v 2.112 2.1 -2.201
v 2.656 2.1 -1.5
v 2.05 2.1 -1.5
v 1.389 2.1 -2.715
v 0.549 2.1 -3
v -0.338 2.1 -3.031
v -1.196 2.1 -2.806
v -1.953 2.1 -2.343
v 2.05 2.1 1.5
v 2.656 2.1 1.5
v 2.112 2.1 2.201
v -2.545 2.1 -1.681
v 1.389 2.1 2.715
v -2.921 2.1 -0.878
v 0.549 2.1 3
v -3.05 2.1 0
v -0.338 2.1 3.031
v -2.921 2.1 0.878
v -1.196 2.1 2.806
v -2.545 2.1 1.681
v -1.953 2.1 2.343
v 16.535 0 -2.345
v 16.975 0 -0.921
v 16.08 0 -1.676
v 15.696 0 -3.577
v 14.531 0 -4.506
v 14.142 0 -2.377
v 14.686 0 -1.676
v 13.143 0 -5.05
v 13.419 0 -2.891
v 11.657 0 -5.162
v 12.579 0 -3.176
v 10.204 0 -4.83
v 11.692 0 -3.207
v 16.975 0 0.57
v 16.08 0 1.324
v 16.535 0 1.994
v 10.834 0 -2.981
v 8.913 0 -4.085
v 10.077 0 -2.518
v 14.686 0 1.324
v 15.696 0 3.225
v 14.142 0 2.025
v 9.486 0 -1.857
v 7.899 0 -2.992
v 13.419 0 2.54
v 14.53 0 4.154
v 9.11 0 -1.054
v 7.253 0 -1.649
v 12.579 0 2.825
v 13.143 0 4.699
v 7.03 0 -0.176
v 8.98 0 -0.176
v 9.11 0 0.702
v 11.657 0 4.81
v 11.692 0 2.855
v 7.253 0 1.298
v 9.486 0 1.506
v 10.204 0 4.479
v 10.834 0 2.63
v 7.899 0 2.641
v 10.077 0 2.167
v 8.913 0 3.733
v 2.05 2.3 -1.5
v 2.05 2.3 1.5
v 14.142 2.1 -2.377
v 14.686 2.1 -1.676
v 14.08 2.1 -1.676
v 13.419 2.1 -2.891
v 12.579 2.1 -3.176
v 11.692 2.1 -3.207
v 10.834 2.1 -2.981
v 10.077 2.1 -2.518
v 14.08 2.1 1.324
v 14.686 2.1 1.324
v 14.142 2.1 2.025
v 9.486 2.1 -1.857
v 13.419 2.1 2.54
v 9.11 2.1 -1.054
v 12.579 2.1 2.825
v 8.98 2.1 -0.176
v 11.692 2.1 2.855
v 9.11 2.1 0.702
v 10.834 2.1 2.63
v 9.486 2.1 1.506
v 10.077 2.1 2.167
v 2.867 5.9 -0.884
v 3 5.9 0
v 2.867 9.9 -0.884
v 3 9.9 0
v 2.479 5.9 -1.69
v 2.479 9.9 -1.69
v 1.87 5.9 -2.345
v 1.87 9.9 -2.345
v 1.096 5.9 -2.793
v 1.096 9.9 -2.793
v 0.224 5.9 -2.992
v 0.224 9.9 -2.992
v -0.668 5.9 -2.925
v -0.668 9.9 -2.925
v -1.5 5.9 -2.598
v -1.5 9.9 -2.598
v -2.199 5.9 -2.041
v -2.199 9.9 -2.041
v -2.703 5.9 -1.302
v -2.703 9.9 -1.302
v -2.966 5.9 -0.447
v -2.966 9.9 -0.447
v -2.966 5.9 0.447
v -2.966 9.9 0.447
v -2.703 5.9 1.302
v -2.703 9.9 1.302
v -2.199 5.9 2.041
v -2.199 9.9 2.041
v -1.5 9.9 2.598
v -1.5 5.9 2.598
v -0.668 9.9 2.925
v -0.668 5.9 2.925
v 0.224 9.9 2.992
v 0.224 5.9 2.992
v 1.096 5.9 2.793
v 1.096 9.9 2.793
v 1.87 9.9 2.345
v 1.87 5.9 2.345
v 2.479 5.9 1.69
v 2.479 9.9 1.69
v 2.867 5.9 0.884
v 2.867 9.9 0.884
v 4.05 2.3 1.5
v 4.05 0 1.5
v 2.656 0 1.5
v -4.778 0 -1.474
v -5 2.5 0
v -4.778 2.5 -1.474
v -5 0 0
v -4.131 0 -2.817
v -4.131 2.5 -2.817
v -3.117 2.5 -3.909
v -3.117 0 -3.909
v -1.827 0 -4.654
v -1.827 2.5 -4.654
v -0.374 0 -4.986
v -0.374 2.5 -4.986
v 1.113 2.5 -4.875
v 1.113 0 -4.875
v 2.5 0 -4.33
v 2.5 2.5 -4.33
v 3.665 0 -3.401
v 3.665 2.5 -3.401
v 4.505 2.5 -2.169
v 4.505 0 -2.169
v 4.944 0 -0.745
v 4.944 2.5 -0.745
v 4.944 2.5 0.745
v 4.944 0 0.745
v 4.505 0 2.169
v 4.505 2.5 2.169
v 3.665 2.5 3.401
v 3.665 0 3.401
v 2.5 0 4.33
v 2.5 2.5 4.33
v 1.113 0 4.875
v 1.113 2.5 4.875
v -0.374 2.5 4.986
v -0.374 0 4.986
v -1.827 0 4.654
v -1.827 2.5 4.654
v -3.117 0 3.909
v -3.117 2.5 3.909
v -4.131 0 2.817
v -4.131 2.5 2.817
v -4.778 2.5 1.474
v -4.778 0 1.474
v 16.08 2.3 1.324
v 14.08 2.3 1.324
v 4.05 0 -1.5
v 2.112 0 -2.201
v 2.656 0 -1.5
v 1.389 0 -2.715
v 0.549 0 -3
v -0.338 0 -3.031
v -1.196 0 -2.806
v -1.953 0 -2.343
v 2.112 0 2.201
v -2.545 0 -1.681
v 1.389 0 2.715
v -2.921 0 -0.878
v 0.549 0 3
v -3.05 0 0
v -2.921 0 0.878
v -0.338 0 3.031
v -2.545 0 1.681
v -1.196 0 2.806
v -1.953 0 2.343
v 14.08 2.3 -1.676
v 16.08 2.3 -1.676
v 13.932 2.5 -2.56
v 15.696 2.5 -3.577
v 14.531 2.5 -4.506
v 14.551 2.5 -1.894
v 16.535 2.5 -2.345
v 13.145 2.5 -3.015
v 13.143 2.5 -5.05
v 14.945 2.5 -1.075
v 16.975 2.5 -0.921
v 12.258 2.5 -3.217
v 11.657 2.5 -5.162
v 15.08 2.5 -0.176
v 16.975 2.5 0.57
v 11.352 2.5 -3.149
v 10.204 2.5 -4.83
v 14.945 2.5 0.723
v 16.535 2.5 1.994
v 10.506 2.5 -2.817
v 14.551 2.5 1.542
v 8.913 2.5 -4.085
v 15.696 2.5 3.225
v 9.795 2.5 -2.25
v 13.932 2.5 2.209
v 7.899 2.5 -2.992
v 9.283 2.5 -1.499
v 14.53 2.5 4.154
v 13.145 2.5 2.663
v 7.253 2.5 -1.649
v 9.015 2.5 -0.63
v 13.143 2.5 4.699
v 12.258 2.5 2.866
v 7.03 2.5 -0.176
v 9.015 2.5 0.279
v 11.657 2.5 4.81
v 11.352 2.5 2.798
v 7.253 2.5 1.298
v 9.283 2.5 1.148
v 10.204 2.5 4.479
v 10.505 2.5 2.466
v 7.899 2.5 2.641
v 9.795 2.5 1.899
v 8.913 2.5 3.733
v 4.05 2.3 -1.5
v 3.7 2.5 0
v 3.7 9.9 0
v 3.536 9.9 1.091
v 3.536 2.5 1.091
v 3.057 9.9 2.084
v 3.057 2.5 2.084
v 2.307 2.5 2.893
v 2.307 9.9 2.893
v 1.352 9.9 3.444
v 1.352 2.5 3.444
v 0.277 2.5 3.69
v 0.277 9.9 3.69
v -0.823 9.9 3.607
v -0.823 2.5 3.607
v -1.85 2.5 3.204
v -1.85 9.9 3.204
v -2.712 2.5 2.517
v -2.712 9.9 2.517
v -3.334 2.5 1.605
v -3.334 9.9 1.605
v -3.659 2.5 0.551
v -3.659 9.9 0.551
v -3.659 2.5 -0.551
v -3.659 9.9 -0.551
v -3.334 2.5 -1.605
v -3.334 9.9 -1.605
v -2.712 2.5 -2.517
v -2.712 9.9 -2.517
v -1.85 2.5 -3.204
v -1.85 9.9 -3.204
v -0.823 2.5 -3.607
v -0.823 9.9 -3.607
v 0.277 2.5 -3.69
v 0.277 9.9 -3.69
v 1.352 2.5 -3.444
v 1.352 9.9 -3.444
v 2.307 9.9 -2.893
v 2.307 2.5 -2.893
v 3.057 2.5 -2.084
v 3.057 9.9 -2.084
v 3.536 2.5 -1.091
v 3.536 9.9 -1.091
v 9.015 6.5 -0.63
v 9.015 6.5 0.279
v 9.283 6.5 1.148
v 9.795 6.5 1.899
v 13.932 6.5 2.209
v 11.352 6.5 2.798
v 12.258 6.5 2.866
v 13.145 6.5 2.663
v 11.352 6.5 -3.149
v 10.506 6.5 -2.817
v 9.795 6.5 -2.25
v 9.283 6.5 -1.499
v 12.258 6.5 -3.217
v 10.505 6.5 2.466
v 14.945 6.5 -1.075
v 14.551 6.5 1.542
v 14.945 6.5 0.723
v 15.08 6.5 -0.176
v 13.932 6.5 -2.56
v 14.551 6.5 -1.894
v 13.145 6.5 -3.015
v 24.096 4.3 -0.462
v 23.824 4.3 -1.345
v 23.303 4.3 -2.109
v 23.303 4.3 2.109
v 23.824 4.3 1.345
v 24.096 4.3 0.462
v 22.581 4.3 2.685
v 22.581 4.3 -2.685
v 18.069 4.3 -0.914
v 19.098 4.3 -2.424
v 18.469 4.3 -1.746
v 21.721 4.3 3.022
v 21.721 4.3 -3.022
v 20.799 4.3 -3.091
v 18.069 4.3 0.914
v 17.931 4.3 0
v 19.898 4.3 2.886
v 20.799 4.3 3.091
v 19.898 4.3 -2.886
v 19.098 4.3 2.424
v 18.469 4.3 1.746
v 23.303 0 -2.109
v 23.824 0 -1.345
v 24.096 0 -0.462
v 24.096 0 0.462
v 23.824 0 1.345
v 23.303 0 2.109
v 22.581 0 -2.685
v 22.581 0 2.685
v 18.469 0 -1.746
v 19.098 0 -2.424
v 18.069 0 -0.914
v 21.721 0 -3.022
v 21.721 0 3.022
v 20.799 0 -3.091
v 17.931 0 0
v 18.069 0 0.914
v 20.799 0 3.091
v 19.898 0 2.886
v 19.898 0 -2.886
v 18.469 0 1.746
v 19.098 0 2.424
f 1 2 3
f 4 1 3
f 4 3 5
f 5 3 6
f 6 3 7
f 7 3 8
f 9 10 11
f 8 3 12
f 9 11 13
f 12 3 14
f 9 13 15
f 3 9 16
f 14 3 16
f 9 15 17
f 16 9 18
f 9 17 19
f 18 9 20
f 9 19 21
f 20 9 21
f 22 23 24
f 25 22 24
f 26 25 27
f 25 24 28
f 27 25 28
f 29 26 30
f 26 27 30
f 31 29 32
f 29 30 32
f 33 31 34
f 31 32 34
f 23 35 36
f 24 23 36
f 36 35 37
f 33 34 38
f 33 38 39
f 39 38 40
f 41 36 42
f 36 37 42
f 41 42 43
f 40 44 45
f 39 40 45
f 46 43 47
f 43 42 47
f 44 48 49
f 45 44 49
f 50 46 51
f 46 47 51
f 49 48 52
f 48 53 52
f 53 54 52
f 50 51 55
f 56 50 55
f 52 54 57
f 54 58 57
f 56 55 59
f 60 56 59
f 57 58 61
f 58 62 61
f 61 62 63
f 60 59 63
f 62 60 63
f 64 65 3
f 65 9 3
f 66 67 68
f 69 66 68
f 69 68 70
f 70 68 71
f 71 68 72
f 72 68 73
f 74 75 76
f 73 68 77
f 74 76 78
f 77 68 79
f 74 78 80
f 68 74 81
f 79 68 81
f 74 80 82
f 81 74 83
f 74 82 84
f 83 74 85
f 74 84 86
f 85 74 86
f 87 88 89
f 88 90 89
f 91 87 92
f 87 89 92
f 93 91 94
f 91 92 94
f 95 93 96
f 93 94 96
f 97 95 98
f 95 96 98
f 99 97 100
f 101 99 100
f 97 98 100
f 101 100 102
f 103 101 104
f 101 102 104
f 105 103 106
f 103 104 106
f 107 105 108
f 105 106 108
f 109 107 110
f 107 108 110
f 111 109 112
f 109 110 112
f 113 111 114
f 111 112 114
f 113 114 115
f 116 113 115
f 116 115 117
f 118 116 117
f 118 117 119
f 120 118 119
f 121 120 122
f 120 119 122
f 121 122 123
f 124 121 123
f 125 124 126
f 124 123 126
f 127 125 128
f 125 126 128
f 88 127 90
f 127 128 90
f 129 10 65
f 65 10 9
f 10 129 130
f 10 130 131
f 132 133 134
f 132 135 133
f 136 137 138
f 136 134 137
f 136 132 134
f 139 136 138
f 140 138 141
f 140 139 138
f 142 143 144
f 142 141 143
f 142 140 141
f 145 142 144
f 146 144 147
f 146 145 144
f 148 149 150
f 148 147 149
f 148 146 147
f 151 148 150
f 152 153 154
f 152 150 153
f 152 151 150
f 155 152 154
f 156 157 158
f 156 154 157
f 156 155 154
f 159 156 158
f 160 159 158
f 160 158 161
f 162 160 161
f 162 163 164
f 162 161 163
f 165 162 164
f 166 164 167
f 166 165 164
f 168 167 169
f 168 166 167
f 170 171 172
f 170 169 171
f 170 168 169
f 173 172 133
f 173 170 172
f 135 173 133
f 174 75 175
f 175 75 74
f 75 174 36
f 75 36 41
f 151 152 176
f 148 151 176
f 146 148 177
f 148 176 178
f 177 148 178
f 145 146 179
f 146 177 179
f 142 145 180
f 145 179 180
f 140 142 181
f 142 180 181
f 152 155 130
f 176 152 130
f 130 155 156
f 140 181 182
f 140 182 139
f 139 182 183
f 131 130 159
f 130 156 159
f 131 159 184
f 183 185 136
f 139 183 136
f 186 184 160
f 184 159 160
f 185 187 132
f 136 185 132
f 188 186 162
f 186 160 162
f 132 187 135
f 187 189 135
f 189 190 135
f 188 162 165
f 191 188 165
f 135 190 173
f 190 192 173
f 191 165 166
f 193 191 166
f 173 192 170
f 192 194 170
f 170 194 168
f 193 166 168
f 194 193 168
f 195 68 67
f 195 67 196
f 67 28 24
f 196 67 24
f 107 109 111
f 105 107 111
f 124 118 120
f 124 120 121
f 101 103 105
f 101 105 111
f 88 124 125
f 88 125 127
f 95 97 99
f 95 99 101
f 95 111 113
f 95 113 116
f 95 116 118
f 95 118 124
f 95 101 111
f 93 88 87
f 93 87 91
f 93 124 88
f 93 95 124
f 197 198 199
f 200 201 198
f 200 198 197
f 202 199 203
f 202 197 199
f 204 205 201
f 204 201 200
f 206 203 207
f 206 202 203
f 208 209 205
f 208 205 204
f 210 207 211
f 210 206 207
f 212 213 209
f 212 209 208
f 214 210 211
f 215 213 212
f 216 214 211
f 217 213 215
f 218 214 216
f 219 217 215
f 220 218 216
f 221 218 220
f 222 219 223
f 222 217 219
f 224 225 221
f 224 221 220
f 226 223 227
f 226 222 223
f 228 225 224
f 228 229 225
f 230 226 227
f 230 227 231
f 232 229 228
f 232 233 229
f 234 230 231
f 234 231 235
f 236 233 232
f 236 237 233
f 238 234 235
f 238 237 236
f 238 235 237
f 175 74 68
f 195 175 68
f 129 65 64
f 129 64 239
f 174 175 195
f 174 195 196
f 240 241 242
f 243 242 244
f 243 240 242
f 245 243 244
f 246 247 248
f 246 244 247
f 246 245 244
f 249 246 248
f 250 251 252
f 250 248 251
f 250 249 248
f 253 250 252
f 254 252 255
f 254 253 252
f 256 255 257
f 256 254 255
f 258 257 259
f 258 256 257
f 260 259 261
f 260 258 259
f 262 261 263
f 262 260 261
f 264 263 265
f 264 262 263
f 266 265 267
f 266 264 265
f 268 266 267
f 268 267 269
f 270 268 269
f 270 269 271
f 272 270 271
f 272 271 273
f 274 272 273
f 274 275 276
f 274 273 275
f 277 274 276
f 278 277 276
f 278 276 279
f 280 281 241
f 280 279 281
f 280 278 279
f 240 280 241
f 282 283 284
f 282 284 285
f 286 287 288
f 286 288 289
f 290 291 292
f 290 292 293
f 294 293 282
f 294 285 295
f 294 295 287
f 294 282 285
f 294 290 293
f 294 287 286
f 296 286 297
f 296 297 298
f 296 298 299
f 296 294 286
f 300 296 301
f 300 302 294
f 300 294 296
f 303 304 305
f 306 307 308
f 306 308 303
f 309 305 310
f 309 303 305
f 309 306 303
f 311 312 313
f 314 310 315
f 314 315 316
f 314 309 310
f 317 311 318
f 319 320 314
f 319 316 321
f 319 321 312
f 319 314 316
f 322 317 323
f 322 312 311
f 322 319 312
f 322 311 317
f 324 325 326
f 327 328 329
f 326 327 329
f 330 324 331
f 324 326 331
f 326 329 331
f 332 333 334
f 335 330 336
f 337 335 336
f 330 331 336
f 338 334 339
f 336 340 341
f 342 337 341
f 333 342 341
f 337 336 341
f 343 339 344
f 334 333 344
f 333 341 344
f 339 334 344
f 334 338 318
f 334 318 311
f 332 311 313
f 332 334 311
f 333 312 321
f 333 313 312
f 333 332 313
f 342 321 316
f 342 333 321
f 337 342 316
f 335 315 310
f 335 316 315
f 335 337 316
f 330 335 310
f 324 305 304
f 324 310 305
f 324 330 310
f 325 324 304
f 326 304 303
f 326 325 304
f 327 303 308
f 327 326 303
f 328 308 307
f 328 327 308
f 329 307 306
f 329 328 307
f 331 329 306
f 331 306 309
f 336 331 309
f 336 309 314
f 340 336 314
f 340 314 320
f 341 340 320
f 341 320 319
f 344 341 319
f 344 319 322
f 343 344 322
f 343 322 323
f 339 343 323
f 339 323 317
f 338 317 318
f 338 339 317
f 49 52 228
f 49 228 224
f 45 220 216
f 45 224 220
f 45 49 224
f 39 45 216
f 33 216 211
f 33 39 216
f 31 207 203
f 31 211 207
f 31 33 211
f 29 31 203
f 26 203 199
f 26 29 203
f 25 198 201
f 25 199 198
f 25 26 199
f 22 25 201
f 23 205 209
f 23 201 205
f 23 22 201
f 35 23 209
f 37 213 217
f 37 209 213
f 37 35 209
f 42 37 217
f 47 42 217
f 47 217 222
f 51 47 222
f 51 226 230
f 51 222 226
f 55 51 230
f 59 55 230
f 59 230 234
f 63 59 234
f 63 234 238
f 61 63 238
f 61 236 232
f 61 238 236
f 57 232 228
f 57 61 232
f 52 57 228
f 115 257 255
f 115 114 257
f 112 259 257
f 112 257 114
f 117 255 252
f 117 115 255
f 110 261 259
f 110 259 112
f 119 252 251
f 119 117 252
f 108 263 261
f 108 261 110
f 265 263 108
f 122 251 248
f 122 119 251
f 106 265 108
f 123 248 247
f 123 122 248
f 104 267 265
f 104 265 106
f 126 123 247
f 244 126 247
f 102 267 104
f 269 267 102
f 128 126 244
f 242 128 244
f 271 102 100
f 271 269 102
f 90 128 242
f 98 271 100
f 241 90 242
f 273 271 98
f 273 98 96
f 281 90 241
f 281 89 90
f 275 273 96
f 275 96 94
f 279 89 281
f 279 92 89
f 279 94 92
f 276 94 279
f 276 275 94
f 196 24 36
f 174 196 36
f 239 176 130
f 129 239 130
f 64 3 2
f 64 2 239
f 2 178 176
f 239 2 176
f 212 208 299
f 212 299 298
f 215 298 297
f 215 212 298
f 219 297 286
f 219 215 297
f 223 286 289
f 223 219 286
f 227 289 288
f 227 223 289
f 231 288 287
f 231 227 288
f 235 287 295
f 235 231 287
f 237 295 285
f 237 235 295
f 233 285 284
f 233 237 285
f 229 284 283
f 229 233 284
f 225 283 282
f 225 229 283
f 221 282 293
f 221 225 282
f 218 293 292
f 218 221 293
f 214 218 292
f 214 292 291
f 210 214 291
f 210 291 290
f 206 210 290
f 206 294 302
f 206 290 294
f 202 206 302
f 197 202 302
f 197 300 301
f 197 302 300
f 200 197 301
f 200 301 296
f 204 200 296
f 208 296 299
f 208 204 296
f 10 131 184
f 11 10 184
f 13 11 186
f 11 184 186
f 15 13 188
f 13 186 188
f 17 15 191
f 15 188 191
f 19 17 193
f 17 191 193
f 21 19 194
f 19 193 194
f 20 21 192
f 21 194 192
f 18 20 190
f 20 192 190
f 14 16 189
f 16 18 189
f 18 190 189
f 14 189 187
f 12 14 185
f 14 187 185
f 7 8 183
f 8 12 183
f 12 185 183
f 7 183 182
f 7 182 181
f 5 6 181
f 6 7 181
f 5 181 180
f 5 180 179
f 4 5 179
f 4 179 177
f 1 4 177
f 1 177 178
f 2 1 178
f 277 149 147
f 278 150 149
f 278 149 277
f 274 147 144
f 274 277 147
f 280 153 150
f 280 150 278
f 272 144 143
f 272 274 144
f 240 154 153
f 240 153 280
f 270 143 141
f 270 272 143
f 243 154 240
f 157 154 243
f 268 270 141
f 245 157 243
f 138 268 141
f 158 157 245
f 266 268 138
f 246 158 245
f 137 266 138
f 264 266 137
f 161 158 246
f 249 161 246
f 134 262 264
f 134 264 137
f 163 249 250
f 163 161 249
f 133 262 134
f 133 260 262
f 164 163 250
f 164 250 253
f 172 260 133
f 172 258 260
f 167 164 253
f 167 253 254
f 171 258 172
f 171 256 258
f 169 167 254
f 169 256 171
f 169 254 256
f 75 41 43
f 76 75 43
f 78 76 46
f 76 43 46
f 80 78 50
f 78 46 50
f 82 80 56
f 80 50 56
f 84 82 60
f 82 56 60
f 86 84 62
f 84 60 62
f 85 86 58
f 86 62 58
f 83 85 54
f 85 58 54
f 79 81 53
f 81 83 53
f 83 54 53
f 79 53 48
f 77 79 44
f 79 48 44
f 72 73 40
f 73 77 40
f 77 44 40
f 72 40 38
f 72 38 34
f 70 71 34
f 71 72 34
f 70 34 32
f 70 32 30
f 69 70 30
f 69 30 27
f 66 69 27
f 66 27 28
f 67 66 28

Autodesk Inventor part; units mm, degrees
ref_plane "YZ Plane" through (0, 0, 0) normal (1, 0, 0) x (0, 1, 0)
ref_plane "XZ Plane" through (0, 0, 0) normal (0, 1, 0) x (-1, 0, 0)
ref_plane "XY Plane" through (0, 0, 0) normal (0, 0, 1) x (1, 0, 0)
sketch "Sketch4" plane through (0, 0, 0) normal (0, 1, 0) x (-1, 0, 0)
  circle A0 centre (0, 0) radius 3.05
  circle A1 centre (0, 0) radius 5
  circle A2 centre (-12.0305, -0.1757) radius 3.05
  circle A3 centre (-12.0305, -0.1757) radius 5
  circle A4 centre (-21.0308, 0) radius 3.1
  dimension "d13" = 6.1
  dimension "d14" = 10
  dimension "d25" = 6.1
  dimension "d26" = 10
  dimension "d30" = 6.2
extrude "Extrusion5" add sketch "Sketch4" along normal blind 2.5 contours A0 | A1 | A2 | A3
extrude "Extrusion6" cut sketch "Sketch4" along normal blind 2.1 contours A0 | A2
sketch "Sketch5" plane through (0, 2.5, 0) normal (0, 1, 0) x (1, 0, 0)
  circle A0 centre (0, 0) radius 3.7
  dimension "d19" = 7.4
extrude "Extrusion7" add sketch "Sketch5" along normal blind 7.4
sketch "Sketch6" plane through (0, 9.9, 0) normal (0, 1, 0) x (1, 0, 0)
  circle A0 centre (0, 0) radius 3
  dimension "d22" = 6
extrude "Extrusion8" cut sketch "Sketch6" against normal blind 4
sketch "Sketch7" plane through (12.0305, 2.5, -0.1757) normal (0, 1, 0) x (1, 0, 0)
  circle A0 centre (0, 0) radius 3.05
  circle A1 centre (0, 0) radius 5 projected
  point P0 (-12.0305, -0.1757)
  dimension "d27" = 6.1
extrude "Extrusion9" add sketch "Sketch7" along normal blind 4 contours A0
extrude "Extrusion10" add sketch "Sketch4" along normal blind 4.3 contours A4
sketch "Sketch8" plane through (0, 0, 0) normal (0, 1, 0) x (-1, 0, 0)
  circle A0 centre (0, 0) radius 3.05 projected
  circle A1 centre (0, 0) radius 5 projected
  circle A2 centre (-12.0305, -0.1757) radius 5 projected
split body "Split1" sketch "Sketch8" result two bodies curves A1 first body at (3.1896, 7.4333, 0.2575)
split body "Split2" sketch "Sketch8" result two bodies bodies 3 curves A2 first body at (7.5887, 1.6667, -0.8976)
sketch "Sketch9" plane through (12.0305, 0, -0.1757) normal (0, -1, 0) x (1, 0, 0)
  line L0 (-7.9805, 1.6757) -> (-9.9805, 1.6757)
  line L1 (-9.9805, 1.6757) -> (-9.9805, -1.3243)
  line L2 (-9.9805, -1.3243) -> (-7.9805, -1.3243)
  line L3 (-7.9805, -1.3243) -> (-7.9805, 1.6757)
  circle A0 centre (-12.0305, 0.1757) radius 3.05 projected
  line L4 (4.05, 1.5) -> (2.05, 1.5)
  line L5 (2.05, 1.5) -> (2.05, -1.5)
  line L6 (2.05, -1.5) -> (4.05, -1.5)
  line L7 (4.05, -1.5) -> (4.05, 1.5)
  circle A1 centre (0, 0) radius 3.05 projected
  point P0 (-9.9805, 0.1757)
  point P1 (2.05, 0)
  dimension "d33" = 2
  dimension "d34" = 3
  dimension "d35" = 1
  dimension "d36" = 2
  dimension "d37" = 3
  dimension "d38" = 1
extrude "Extrusion11" cut sketch "Sketch9" against normal blind 2.3 contours L3 L2 A0 L0 | A0 L2 L1 L0 | L7 L6 A1 L4 | A1 L6 L5 L4 picked at (-9.6472, 0.1757) picked at (2.3833, 0) bodies 4 2
equation "\"d19\" = Shaft_Diameter - Shaft_Fit_Loose"
equation "\"d20\" = Shaft_Width + Shaft_Width_Free_Space"
equation "\"Shaft_Diameter\" = 8"
equation "\"Shaft_Fit_Loose\" = 0.6"
equation "\"Shaft_Width\" = 7"
equation "\"Shaft_Width_Free_Space\" = 0.4"
properties part number "Multiboard Thread insert"
